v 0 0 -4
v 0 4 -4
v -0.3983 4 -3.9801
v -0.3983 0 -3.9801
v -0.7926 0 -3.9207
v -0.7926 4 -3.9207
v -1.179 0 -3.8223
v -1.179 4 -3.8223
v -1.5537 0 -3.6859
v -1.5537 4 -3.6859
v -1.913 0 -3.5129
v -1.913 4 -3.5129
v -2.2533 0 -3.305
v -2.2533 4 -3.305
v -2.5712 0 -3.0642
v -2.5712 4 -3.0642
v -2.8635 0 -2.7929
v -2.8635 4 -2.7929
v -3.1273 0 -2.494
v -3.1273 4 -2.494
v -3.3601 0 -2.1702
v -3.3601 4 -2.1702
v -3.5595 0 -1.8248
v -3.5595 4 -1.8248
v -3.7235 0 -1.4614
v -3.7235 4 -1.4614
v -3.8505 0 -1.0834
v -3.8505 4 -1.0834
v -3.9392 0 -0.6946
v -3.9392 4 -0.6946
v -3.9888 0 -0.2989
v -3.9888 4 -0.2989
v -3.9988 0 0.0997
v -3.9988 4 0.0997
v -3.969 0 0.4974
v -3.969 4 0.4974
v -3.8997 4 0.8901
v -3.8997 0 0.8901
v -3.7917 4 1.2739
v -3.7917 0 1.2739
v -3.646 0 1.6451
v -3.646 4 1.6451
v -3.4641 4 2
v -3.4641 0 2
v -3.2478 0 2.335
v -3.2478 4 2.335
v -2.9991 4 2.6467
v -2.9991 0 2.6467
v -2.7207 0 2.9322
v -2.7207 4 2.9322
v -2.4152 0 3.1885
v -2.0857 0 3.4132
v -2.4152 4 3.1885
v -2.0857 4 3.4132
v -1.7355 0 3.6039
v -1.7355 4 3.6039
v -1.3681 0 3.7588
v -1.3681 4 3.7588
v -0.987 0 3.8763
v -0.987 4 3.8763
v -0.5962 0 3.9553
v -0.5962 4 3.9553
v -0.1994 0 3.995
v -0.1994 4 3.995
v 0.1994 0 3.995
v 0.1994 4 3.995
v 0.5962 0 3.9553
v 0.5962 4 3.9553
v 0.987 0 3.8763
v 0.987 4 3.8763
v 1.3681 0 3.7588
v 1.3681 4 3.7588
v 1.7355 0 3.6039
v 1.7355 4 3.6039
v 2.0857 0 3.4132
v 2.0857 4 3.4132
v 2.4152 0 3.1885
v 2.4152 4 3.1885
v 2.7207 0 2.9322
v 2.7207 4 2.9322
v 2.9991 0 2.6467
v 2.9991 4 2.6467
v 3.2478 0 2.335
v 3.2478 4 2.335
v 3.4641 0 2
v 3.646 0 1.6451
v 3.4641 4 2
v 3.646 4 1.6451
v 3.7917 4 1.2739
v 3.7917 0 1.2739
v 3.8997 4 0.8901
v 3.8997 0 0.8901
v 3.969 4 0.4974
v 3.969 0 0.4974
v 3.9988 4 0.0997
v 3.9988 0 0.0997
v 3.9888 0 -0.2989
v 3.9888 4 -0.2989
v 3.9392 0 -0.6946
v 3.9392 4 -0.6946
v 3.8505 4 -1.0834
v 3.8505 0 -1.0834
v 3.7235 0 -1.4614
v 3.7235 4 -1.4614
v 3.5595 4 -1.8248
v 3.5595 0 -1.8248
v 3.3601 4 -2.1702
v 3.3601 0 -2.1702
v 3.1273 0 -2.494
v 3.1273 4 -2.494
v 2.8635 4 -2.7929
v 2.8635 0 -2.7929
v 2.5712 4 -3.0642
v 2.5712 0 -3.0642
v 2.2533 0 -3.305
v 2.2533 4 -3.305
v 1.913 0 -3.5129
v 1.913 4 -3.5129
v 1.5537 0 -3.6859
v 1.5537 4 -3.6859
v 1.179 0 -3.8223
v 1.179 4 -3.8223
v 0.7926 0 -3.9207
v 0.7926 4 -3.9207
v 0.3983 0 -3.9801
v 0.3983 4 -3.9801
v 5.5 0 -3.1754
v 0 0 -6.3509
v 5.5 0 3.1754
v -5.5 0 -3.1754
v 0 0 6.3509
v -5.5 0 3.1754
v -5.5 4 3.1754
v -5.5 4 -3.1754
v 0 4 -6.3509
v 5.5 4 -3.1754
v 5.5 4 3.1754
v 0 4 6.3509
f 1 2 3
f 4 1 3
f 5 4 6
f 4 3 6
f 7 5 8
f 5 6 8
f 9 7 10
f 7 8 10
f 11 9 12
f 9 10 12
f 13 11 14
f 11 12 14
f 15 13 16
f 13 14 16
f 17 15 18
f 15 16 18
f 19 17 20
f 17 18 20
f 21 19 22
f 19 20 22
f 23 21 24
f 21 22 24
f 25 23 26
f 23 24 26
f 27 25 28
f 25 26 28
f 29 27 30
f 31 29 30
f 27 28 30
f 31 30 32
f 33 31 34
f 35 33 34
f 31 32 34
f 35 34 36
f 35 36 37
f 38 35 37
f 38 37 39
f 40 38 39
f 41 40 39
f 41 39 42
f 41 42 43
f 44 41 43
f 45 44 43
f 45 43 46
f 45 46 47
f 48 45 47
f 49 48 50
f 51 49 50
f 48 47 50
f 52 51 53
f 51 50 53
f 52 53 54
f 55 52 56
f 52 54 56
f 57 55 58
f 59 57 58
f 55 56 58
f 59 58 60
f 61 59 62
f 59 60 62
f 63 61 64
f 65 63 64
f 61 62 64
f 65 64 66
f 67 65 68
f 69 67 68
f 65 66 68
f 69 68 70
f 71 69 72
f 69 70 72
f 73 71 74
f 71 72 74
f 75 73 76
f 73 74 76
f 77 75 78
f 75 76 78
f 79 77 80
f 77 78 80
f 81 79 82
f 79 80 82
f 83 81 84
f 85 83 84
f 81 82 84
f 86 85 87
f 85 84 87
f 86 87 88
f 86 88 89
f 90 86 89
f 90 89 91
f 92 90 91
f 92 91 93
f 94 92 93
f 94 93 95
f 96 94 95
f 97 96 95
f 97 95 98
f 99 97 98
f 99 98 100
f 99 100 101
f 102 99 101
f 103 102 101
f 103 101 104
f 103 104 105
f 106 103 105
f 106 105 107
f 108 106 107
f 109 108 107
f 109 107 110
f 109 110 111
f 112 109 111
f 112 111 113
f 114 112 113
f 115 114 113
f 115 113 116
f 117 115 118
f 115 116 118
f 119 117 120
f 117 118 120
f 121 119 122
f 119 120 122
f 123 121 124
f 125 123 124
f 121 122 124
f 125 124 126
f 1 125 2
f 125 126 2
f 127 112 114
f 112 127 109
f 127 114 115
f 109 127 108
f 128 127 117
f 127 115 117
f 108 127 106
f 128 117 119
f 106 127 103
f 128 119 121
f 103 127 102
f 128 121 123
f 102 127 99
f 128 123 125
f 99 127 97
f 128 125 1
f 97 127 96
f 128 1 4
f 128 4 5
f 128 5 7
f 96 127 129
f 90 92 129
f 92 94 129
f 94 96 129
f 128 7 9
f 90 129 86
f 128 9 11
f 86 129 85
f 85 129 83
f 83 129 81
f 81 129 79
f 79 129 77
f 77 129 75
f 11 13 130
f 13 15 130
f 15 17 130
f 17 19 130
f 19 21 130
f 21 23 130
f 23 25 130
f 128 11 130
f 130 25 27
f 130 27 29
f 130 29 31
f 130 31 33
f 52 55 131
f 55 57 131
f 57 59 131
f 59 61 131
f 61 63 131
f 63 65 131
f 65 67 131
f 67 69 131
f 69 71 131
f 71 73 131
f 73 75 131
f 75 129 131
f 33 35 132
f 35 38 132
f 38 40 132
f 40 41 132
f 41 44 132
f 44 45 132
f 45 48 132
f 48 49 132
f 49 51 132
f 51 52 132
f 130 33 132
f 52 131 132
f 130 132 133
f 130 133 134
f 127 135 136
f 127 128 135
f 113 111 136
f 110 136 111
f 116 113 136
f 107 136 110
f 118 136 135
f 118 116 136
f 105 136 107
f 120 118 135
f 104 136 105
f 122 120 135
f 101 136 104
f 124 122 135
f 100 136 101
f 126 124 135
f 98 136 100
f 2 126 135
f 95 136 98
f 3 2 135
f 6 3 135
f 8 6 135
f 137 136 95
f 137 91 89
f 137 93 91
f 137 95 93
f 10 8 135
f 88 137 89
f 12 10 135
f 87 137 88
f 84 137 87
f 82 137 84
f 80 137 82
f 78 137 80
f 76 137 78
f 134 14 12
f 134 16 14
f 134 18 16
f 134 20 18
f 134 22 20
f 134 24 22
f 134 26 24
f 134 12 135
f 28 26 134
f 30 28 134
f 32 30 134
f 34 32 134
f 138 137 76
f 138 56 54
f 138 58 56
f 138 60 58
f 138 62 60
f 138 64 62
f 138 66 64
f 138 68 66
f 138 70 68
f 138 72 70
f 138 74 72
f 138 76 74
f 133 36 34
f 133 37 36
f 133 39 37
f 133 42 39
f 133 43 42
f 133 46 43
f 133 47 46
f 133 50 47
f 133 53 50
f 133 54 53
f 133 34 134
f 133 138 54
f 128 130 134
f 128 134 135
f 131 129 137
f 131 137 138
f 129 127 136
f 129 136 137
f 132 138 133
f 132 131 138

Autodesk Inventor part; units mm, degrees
ref_plane "YZ Plane" through (0, 0, 0) normal (1, 0, 0) x (0, 1, 0)
ref_plane "XZ Plane" through (0, 0, 0) normal (0, 1, 0) x (-1, 0, 0)
ref_plane "XY Plane" through (0, 0, 0) normal (0, 0, 1) x (1, 0, 0)
sketch "Sketch1" plane through (0, 0, 0) normal (0, 1, 0) x (-1, 0, 0)
  line L0 (-5.5, 3.1754) -> (0, 6.3509)
  line L1 (0, 6.3509) -> (5.5, 3.1754)
  line L2 (5.5, 3.1754) -> (5.5, -3.1754)
  line L3 (5.5, -3.1754) -> (0, -6.3509)
  line L4 (0, -6.3509) -> (-5.5, -3.1754)
  line L5 (-5.5, -3.1754) -> (-5.5, 3.1754)
  line L6 (0, 7.2373) -> (0, -7.2373)
  point P0 (0, 0)
  point P1 (0, 0)
  point P2 (0, 0)
  point P3 (0, 0)
  dimension "d0" = 11
extrude "Extrusion1" add sketch "Sketch1" along normal blind 4
hole "Hole1" at (0, 0, 0) direction (0, 1, 0) diameter 8 end through all
thread "Thread1" size "M8x1.25" class "6H" standard "ANSI Metric M Profile" full length
properties part number "HUDSON-1-79"
